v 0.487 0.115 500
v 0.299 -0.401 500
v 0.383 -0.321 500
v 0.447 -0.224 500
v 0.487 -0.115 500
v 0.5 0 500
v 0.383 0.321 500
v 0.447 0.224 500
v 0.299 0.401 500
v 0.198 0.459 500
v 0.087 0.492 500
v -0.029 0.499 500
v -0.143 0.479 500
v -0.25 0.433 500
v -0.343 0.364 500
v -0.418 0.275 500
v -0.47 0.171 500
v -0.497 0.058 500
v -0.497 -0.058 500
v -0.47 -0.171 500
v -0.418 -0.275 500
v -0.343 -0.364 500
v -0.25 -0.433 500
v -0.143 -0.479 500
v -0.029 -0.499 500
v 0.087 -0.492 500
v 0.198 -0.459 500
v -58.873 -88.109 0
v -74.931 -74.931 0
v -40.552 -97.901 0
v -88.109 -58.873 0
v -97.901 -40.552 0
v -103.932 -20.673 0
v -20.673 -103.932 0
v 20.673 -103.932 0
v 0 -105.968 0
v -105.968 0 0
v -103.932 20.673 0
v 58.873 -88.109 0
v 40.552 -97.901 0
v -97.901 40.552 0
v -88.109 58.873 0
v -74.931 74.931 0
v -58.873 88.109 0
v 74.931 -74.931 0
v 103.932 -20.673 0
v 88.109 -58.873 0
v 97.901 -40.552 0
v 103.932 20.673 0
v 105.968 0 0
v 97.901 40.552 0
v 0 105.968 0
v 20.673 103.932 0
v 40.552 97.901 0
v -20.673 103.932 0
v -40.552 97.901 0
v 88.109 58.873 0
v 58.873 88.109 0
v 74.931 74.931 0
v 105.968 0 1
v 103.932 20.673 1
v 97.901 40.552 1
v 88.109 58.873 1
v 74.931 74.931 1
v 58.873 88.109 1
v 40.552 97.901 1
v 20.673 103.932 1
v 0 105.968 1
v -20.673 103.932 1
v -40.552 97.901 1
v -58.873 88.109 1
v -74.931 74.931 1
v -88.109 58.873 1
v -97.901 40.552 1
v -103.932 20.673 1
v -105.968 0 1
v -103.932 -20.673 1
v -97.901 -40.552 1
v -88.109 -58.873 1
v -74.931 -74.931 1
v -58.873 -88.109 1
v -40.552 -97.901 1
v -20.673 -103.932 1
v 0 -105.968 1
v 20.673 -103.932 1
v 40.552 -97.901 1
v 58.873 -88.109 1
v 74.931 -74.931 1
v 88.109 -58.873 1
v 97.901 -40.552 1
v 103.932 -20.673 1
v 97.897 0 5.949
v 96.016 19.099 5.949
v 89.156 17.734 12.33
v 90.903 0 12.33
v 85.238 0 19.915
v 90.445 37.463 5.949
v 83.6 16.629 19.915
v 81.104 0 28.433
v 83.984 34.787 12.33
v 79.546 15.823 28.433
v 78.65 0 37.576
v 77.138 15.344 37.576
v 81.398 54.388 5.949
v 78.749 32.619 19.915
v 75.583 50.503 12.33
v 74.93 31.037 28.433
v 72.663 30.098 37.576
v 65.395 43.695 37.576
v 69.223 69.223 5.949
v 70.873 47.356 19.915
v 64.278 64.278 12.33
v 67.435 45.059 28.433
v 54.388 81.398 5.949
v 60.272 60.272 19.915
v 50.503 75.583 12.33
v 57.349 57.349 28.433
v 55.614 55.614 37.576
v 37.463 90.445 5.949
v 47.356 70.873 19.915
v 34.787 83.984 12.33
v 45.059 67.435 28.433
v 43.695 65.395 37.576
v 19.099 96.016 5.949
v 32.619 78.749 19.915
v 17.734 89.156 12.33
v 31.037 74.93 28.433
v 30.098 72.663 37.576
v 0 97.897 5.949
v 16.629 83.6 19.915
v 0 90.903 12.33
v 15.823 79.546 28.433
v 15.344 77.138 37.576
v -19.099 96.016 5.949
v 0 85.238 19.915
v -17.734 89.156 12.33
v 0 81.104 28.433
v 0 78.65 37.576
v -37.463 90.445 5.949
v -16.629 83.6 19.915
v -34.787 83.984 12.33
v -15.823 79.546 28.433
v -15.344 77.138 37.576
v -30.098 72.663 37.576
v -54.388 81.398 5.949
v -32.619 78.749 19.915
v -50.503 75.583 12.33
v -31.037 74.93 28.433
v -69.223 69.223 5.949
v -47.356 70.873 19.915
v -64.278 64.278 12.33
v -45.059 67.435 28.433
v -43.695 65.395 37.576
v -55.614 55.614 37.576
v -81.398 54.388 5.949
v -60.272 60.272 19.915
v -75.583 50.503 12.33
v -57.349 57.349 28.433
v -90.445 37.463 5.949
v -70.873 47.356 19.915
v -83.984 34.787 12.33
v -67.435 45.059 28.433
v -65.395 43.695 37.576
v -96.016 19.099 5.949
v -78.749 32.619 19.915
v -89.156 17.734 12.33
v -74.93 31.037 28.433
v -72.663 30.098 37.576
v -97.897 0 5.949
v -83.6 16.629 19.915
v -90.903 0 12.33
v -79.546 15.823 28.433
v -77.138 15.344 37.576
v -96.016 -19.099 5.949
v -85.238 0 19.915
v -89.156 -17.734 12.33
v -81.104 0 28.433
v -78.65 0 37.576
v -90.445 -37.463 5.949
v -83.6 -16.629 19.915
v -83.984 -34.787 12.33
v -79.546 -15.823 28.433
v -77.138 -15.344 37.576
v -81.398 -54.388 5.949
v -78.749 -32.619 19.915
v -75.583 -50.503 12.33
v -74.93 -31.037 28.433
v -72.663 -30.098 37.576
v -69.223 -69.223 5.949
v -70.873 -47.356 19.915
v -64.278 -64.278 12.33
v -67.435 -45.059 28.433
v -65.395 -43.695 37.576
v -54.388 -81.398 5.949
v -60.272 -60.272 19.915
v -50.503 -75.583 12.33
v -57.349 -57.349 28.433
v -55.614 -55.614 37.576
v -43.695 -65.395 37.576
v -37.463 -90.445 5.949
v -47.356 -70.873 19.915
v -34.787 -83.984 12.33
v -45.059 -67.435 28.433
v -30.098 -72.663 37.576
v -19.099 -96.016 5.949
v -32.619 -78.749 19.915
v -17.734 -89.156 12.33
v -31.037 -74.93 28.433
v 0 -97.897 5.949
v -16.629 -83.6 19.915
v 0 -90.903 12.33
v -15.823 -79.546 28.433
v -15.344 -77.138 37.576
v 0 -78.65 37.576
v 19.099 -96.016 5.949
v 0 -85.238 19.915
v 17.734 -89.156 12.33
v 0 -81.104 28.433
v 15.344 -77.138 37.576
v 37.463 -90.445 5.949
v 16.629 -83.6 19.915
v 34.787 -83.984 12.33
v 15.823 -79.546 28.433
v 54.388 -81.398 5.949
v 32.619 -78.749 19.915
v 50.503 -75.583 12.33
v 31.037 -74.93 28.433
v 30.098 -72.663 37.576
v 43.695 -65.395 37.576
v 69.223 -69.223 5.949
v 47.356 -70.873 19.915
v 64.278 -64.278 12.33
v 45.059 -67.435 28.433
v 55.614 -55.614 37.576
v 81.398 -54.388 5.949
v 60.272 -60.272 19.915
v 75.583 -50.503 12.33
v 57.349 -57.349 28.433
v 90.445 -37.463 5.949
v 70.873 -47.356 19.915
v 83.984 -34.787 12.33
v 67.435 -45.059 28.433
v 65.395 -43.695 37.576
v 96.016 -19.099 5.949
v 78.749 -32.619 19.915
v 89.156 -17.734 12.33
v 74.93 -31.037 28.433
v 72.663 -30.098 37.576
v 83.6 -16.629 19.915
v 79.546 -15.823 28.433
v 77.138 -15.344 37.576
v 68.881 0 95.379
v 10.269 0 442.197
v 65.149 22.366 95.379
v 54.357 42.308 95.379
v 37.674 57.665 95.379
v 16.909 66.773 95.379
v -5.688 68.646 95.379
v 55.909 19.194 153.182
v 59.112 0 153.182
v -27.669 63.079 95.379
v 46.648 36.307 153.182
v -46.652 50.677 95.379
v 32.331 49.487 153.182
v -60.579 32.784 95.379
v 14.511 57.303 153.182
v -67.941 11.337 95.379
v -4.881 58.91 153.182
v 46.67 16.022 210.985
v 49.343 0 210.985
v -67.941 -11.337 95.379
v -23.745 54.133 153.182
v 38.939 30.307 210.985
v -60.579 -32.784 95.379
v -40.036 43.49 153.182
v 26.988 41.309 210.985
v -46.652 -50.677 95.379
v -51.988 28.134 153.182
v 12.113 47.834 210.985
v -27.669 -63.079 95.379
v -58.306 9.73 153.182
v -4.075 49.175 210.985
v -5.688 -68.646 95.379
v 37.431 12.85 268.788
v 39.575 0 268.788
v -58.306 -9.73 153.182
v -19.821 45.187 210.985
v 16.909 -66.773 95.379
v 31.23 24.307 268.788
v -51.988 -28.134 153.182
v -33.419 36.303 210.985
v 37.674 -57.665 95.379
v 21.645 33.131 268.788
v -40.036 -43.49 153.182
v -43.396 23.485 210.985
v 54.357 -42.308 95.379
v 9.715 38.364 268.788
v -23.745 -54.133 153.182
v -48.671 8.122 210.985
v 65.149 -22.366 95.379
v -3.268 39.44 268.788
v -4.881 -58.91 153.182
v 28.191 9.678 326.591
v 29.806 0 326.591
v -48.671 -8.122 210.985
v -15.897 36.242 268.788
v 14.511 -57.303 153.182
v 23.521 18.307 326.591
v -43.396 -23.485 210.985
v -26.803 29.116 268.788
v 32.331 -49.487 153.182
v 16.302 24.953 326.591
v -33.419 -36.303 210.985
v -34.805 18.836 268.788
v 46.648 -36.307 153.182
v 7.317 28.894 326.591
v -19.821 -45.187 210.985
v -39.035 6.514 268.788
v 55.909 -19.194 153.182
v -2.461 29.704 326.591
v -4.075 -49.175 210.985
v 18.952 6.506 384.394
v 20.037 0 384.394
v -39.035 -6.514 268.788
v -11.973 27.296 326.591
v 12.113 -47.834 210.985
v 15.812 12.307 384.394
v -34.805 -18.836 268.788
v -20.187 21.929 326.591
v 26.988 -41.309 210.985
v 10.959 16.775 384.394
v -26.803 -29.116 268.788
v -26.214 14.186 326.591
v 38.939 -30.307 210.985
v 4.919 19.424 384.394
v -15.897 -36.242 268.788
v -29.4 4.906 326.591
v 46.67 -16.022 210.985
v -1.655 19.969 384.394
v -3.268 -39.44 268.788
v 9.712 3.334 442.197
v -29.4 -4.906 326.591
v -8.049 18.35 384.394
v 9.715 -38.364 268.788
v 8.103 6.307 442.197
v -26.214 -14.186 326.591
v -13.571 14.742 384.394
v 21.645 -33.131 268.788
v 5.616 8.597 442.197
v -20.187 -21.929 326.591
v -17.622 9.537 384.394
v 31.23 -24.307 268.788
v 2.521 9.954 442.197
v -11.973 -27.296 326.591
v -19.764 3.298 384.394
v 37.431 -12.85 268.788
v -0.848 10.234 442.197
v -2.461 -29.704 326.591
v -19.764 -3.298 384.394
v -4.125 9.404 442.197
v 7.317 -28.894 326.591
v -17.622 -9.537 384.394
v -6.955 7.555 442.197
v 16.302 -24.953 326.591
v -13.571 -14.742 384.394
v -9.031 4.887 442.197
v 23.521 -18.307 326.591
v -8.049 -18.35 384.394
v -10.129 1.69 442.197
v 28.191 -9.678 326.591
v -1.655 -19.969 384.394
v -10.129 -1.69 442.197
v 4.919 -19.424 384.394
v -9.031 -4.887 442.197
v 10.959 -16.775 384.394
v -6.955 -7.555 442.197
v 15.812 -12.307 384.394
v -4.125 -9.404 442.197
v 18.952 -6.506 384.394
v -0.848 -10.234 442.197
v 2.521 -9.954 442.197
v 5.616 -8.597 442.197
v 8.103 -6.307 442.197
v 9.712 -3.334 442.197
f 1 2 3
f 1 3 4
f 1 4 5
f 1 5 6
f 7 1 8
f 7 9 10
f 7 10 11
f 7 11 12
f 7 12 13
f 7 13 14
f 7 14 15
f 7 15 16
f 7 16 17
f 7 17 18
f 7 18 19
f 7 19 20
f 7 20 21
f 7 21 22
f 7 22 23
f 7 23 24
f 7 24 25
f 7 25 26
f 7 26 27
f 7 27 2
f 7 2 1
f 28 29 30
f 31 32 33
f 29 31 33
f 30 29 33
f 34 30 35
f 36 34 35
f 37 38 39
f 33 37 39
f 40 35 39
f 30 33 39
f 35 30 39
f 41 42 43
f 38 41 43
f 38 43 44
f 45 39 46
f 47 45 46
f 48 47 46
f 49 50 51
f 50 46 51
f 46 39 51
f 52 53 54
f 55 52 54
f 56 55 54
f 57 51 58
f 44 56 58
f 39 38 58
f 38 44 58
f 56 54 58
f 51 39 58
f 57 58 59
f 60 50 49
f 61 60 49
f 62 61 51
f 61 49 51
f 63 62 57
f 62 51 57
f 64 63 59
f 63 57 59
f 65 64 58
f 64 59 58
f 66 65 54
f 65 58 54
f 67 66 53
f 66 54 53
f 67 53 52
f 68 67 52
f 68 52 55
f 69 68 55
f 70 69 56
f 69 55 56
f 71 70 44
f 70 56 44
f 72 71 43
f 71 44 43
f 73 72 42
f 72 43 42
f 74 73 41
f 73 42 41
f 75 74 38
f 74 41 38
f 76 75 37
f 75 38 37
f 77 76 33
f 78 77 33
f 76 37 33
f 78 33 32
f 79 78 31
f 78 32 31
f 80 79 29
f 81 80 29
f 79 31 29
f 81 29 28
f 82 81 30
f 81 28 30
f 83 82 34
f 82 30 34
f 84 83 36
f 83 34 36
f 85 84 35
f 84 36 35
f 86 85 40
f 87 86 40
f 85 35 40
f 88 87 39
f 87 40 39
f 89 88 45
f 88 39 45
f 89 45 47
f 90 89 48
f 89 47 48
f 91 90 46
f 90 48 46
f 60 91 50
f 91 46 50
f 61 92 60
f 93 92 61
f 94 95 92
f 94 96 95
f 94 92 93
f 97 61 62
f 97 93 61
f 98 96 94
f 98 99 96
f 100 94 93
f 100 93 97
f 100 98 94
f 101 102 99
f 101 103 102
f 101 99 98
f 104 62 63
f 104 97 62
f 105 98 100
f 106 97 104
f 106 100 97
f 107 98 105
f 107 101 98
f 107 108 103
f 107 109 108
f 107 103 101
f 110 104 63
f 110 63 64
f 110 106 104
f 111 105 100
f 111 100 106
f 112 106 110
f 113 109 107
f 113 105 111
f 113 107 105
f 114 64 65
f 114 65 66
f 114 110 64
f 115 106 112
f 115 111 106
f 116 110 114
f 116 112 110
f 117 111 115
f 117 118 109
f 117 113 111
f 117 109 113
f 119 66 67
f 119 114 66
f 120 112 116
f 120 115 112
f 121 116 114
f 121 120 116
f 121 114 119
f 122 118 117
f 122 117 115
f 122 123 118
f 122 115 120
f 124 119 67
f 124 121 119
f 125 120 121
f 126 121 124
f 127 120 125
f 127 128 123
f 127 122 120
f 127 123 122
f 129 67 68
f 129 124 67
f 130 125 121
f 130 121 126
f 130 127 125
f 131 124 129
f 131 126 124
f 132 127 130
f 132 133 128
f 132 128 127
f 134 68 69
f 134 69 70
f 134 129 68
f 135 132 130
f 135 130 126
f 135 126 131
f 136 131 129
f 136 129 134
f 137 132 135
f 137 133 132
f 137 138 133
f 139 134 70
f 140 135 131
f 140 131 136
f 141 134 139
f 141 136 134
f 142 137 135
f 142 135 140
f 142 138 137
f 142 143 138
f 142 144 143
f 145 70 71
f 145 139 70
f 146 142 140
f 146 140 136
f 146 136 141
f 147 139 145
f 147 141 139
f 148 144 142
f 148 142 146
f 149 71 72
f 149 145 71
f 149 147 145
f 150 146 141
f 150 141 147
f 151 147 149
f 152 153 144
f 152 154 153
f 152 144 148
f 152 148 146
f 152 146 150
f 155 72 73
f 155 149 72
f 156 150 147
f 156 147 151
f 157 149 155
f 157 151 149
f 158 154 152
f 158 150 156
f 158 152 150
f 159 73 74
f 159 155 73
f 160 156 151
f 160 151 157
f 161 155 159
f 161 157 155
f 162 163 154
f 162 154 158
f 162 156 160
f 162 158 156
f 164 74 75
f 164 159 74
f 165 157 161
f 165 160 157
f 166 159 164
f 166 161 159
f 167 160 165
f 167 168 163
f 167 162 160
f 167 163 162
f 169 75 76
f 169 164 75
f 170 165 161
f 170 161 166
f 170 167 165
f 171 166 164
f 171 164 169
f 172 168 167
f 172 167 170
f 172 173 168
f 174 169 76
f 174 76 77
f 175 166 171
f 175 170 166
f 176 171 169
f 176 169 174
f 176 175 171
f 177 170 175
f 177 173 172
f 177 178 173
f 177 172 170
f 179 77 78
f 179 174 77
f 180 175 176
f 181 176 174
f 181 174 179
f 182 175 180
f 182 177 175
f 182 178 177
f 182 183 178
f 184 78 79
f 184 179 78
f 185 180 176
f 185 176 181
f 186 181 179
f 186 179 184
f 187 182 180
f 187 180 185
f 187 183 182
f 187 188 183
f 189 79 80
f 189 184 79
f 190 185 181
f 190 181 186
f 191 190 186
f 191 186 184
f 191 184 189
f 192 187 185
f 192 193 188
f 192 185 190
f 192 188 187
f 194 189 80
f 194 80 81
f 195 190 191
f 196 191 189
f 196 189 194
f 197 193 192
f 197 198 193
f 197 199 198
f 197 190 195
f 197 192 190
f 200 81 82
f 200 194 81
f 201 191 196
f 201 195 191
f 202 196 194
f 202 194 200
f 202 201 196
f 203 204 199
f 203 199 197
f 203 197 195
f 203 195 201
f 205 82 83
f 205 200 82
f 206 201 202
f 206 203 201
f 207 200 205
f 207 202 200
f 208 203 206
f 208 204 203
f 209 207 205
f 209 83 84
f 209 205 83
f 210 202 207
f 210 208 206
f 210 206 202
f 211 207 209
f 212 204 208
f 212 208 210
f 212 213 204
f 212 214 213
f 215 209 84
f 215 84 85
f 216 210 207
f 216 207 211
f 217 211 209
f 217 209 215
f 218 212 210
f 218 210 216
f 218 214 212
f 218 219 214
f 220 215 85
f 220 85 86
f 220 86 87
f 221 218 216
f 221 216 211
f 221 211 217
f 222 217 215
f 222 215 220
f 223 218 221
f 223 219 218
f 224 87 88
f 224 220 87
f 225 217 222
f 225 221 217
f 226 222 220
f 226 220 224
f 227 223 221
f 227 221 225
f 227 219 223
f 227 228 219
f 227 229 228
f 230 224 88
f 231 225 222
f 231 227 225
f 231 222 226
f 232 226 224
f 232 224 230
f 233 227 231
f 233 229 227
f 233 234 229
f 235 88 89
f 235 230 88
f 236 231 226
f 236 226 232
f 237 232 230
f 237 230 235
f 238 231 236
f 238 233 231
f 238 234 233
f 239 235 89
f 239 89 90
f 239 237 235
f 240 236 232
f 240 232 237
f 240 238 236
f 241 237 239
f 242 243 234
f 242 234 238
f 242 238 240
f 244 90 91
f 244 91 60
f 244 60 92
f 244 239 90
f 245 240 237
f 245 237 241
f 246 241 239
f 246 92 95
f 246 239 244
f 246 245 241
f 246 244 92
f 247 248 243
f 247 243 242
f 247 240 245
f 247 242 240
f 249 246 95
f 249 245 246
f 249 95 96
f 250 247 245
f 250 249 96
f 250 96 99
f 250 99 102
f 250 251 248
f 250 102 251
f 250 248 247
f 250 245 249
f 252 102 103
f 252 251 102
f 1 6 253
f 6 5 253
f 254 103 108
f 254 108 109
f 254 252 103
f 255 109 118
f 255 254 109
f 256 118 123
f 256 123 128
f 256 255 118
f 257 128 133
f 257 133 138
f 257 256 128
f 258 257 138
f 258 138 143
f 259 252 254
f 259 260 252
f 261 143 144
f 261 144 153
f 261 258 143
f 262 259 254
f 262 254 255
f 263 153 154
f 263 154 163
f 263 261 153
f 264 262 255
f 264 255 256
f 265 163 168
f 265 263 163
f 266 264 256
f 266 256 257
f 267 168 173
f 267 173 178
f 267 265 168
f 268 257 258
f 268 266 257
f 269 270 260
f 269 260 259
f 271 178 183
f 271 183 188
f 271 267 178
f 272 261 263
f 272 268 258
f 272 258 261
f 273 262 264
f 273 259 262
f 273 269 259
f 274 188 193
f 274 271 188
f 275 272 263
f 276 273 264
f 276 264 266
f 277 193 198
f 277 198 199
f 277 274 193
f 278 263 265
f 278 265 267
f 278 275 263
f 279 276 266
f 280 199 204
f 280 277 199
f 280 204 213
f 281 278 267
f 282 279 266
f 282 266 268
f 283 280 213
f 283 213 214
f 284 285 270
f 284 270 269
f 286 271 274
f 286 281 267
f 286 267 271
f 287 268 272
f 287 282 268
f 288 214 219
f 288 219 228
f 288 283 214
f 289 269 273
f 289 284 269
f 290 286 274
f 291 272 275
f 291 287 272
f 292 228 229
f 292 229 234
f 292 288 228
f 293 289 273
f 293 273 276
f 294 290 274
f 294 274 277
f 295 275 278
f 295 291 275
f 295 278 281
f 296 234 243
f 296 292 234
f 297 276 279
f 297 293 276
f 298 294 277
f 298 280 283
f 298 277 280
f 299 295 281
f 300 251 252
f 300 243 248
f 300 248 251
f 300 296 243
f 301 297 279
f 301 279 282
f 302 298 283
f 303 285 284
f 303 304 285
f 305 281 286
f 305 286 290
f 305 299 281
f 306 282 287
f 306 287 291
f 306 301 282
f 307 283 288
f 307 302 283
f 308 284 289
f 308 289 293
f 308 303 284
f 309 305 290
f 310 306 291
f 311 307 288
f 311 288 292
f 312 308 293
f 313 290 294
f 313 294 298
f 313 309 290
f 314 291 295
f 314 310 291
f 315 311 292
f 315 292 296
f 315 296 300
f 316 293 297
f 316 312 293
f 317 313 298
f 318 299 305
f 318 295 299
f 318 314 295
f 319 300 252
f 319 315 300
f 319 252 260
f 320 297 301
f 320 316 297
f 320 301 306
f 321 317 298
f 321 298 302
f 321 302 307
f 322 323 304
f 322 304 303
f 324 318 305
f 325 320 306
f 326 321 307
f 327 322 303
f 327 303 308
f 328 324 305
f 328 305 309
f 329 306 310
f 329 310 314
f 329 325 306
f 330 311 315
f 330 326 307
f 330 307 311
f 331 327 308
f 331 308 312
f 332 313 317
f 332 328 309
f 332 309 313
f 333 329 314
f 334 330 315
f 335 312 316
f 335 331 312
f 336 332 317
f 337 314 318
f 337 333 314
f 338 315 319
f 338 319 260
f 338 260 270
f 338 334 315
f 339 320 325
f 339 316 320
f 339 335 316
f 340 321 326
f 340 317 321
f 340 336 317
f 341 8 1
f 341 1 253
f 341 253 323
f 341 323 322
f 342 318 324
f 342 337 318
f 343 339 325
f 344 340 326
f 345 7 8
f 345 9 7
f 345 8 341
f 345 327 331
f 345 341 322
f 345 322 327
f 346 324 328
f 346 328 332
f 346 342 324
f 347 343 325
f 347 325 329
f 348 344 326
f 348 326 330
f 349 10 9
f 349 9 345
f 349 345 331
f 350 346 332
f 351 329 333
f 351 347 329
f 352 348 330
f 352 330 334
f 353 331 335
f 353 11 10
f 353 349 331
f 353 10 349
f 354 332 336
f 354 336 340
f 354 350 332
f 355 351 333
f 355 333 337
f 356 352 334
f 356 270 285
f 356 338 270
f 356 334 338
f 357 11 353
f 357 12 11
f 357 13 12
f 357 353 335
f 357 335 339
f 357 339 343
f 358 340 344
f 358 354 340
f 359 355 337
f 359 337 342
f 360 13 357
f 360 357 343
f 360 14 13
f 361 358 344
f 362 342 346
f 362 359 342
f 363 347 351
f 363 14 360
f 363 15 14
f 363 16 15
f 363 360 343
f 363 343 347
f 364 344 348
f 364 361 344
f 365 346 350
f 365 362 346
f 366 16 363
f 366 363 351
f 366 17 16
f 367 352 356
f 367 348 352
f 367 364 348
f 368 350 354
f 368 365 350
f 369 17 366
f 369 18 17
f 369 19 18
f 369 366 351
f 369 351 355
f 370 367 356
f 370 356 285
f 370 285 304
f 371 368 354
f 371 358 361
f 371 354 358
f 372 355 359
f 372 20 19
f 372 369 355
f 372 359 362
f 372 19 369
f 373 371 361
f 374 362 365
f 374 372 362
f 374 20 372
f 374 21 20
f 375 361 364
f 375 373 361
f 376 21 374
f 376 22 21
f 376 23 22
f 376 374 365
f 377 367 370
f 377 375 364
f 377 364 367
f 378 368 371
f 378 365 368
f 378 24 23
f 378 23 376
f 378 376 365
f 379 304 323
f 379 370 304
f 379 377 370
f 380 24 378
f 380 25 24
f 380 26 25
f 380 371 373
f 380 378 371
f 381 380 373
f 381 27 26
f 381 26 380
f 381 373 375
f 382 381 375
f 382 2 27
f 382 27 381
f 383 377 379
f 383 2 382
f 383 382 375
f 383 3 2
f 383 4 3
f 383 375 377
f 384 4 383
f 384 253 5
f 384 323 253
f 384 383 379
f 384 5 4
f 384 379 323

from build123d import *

# Parameters (mm, degrees)
F0_R     = 85
F2_R     = 0.5
F4_R     = 105.9677495378
F5_DEPTH = 1


# Not quite as in the source:
# - a fillet or chamfer that OpenCascade refuses, or shapes differently, is made with other operations: its cross-section is extruded or revolved along the edge and cut away or added


with BuildPart() as f3:
    # F0 (on Top) → F3 section 0
    with BuildSketch(Plane.XY):
        Circle(F0_R)
    # F2 (on offset) → F3 section 1
    with BuildSketch(Plane.XY.offset(500)):
        Circle(F2_R)
    loft()

    # F4 (on Top) → F5 (join)
    with BuildSketch(Plane.XY):
        Circle(F4_R)
    extrude(amount=F5_DEPTH)

    # F6: fillet of radius 50 on 1 edges, made by hand

    # F6_s1 → F6_t2 (revolve)
    with BuildSketch(Plane.XZ):
        with BuildLine():
            ThreePointArc((105.9677495378, 1), (87.890537333, 15.9884437146), (78.6495736084, 37.5764875242))
            Line((78.6495736084, 37.5764875242), (84.831, 1))
            Line((84.831, 1), (105.9677495378, 1))
        make_face()
    revolve(axis=Axis((0, 0, 1), (0, 0, 1)))


solid = f3.part
